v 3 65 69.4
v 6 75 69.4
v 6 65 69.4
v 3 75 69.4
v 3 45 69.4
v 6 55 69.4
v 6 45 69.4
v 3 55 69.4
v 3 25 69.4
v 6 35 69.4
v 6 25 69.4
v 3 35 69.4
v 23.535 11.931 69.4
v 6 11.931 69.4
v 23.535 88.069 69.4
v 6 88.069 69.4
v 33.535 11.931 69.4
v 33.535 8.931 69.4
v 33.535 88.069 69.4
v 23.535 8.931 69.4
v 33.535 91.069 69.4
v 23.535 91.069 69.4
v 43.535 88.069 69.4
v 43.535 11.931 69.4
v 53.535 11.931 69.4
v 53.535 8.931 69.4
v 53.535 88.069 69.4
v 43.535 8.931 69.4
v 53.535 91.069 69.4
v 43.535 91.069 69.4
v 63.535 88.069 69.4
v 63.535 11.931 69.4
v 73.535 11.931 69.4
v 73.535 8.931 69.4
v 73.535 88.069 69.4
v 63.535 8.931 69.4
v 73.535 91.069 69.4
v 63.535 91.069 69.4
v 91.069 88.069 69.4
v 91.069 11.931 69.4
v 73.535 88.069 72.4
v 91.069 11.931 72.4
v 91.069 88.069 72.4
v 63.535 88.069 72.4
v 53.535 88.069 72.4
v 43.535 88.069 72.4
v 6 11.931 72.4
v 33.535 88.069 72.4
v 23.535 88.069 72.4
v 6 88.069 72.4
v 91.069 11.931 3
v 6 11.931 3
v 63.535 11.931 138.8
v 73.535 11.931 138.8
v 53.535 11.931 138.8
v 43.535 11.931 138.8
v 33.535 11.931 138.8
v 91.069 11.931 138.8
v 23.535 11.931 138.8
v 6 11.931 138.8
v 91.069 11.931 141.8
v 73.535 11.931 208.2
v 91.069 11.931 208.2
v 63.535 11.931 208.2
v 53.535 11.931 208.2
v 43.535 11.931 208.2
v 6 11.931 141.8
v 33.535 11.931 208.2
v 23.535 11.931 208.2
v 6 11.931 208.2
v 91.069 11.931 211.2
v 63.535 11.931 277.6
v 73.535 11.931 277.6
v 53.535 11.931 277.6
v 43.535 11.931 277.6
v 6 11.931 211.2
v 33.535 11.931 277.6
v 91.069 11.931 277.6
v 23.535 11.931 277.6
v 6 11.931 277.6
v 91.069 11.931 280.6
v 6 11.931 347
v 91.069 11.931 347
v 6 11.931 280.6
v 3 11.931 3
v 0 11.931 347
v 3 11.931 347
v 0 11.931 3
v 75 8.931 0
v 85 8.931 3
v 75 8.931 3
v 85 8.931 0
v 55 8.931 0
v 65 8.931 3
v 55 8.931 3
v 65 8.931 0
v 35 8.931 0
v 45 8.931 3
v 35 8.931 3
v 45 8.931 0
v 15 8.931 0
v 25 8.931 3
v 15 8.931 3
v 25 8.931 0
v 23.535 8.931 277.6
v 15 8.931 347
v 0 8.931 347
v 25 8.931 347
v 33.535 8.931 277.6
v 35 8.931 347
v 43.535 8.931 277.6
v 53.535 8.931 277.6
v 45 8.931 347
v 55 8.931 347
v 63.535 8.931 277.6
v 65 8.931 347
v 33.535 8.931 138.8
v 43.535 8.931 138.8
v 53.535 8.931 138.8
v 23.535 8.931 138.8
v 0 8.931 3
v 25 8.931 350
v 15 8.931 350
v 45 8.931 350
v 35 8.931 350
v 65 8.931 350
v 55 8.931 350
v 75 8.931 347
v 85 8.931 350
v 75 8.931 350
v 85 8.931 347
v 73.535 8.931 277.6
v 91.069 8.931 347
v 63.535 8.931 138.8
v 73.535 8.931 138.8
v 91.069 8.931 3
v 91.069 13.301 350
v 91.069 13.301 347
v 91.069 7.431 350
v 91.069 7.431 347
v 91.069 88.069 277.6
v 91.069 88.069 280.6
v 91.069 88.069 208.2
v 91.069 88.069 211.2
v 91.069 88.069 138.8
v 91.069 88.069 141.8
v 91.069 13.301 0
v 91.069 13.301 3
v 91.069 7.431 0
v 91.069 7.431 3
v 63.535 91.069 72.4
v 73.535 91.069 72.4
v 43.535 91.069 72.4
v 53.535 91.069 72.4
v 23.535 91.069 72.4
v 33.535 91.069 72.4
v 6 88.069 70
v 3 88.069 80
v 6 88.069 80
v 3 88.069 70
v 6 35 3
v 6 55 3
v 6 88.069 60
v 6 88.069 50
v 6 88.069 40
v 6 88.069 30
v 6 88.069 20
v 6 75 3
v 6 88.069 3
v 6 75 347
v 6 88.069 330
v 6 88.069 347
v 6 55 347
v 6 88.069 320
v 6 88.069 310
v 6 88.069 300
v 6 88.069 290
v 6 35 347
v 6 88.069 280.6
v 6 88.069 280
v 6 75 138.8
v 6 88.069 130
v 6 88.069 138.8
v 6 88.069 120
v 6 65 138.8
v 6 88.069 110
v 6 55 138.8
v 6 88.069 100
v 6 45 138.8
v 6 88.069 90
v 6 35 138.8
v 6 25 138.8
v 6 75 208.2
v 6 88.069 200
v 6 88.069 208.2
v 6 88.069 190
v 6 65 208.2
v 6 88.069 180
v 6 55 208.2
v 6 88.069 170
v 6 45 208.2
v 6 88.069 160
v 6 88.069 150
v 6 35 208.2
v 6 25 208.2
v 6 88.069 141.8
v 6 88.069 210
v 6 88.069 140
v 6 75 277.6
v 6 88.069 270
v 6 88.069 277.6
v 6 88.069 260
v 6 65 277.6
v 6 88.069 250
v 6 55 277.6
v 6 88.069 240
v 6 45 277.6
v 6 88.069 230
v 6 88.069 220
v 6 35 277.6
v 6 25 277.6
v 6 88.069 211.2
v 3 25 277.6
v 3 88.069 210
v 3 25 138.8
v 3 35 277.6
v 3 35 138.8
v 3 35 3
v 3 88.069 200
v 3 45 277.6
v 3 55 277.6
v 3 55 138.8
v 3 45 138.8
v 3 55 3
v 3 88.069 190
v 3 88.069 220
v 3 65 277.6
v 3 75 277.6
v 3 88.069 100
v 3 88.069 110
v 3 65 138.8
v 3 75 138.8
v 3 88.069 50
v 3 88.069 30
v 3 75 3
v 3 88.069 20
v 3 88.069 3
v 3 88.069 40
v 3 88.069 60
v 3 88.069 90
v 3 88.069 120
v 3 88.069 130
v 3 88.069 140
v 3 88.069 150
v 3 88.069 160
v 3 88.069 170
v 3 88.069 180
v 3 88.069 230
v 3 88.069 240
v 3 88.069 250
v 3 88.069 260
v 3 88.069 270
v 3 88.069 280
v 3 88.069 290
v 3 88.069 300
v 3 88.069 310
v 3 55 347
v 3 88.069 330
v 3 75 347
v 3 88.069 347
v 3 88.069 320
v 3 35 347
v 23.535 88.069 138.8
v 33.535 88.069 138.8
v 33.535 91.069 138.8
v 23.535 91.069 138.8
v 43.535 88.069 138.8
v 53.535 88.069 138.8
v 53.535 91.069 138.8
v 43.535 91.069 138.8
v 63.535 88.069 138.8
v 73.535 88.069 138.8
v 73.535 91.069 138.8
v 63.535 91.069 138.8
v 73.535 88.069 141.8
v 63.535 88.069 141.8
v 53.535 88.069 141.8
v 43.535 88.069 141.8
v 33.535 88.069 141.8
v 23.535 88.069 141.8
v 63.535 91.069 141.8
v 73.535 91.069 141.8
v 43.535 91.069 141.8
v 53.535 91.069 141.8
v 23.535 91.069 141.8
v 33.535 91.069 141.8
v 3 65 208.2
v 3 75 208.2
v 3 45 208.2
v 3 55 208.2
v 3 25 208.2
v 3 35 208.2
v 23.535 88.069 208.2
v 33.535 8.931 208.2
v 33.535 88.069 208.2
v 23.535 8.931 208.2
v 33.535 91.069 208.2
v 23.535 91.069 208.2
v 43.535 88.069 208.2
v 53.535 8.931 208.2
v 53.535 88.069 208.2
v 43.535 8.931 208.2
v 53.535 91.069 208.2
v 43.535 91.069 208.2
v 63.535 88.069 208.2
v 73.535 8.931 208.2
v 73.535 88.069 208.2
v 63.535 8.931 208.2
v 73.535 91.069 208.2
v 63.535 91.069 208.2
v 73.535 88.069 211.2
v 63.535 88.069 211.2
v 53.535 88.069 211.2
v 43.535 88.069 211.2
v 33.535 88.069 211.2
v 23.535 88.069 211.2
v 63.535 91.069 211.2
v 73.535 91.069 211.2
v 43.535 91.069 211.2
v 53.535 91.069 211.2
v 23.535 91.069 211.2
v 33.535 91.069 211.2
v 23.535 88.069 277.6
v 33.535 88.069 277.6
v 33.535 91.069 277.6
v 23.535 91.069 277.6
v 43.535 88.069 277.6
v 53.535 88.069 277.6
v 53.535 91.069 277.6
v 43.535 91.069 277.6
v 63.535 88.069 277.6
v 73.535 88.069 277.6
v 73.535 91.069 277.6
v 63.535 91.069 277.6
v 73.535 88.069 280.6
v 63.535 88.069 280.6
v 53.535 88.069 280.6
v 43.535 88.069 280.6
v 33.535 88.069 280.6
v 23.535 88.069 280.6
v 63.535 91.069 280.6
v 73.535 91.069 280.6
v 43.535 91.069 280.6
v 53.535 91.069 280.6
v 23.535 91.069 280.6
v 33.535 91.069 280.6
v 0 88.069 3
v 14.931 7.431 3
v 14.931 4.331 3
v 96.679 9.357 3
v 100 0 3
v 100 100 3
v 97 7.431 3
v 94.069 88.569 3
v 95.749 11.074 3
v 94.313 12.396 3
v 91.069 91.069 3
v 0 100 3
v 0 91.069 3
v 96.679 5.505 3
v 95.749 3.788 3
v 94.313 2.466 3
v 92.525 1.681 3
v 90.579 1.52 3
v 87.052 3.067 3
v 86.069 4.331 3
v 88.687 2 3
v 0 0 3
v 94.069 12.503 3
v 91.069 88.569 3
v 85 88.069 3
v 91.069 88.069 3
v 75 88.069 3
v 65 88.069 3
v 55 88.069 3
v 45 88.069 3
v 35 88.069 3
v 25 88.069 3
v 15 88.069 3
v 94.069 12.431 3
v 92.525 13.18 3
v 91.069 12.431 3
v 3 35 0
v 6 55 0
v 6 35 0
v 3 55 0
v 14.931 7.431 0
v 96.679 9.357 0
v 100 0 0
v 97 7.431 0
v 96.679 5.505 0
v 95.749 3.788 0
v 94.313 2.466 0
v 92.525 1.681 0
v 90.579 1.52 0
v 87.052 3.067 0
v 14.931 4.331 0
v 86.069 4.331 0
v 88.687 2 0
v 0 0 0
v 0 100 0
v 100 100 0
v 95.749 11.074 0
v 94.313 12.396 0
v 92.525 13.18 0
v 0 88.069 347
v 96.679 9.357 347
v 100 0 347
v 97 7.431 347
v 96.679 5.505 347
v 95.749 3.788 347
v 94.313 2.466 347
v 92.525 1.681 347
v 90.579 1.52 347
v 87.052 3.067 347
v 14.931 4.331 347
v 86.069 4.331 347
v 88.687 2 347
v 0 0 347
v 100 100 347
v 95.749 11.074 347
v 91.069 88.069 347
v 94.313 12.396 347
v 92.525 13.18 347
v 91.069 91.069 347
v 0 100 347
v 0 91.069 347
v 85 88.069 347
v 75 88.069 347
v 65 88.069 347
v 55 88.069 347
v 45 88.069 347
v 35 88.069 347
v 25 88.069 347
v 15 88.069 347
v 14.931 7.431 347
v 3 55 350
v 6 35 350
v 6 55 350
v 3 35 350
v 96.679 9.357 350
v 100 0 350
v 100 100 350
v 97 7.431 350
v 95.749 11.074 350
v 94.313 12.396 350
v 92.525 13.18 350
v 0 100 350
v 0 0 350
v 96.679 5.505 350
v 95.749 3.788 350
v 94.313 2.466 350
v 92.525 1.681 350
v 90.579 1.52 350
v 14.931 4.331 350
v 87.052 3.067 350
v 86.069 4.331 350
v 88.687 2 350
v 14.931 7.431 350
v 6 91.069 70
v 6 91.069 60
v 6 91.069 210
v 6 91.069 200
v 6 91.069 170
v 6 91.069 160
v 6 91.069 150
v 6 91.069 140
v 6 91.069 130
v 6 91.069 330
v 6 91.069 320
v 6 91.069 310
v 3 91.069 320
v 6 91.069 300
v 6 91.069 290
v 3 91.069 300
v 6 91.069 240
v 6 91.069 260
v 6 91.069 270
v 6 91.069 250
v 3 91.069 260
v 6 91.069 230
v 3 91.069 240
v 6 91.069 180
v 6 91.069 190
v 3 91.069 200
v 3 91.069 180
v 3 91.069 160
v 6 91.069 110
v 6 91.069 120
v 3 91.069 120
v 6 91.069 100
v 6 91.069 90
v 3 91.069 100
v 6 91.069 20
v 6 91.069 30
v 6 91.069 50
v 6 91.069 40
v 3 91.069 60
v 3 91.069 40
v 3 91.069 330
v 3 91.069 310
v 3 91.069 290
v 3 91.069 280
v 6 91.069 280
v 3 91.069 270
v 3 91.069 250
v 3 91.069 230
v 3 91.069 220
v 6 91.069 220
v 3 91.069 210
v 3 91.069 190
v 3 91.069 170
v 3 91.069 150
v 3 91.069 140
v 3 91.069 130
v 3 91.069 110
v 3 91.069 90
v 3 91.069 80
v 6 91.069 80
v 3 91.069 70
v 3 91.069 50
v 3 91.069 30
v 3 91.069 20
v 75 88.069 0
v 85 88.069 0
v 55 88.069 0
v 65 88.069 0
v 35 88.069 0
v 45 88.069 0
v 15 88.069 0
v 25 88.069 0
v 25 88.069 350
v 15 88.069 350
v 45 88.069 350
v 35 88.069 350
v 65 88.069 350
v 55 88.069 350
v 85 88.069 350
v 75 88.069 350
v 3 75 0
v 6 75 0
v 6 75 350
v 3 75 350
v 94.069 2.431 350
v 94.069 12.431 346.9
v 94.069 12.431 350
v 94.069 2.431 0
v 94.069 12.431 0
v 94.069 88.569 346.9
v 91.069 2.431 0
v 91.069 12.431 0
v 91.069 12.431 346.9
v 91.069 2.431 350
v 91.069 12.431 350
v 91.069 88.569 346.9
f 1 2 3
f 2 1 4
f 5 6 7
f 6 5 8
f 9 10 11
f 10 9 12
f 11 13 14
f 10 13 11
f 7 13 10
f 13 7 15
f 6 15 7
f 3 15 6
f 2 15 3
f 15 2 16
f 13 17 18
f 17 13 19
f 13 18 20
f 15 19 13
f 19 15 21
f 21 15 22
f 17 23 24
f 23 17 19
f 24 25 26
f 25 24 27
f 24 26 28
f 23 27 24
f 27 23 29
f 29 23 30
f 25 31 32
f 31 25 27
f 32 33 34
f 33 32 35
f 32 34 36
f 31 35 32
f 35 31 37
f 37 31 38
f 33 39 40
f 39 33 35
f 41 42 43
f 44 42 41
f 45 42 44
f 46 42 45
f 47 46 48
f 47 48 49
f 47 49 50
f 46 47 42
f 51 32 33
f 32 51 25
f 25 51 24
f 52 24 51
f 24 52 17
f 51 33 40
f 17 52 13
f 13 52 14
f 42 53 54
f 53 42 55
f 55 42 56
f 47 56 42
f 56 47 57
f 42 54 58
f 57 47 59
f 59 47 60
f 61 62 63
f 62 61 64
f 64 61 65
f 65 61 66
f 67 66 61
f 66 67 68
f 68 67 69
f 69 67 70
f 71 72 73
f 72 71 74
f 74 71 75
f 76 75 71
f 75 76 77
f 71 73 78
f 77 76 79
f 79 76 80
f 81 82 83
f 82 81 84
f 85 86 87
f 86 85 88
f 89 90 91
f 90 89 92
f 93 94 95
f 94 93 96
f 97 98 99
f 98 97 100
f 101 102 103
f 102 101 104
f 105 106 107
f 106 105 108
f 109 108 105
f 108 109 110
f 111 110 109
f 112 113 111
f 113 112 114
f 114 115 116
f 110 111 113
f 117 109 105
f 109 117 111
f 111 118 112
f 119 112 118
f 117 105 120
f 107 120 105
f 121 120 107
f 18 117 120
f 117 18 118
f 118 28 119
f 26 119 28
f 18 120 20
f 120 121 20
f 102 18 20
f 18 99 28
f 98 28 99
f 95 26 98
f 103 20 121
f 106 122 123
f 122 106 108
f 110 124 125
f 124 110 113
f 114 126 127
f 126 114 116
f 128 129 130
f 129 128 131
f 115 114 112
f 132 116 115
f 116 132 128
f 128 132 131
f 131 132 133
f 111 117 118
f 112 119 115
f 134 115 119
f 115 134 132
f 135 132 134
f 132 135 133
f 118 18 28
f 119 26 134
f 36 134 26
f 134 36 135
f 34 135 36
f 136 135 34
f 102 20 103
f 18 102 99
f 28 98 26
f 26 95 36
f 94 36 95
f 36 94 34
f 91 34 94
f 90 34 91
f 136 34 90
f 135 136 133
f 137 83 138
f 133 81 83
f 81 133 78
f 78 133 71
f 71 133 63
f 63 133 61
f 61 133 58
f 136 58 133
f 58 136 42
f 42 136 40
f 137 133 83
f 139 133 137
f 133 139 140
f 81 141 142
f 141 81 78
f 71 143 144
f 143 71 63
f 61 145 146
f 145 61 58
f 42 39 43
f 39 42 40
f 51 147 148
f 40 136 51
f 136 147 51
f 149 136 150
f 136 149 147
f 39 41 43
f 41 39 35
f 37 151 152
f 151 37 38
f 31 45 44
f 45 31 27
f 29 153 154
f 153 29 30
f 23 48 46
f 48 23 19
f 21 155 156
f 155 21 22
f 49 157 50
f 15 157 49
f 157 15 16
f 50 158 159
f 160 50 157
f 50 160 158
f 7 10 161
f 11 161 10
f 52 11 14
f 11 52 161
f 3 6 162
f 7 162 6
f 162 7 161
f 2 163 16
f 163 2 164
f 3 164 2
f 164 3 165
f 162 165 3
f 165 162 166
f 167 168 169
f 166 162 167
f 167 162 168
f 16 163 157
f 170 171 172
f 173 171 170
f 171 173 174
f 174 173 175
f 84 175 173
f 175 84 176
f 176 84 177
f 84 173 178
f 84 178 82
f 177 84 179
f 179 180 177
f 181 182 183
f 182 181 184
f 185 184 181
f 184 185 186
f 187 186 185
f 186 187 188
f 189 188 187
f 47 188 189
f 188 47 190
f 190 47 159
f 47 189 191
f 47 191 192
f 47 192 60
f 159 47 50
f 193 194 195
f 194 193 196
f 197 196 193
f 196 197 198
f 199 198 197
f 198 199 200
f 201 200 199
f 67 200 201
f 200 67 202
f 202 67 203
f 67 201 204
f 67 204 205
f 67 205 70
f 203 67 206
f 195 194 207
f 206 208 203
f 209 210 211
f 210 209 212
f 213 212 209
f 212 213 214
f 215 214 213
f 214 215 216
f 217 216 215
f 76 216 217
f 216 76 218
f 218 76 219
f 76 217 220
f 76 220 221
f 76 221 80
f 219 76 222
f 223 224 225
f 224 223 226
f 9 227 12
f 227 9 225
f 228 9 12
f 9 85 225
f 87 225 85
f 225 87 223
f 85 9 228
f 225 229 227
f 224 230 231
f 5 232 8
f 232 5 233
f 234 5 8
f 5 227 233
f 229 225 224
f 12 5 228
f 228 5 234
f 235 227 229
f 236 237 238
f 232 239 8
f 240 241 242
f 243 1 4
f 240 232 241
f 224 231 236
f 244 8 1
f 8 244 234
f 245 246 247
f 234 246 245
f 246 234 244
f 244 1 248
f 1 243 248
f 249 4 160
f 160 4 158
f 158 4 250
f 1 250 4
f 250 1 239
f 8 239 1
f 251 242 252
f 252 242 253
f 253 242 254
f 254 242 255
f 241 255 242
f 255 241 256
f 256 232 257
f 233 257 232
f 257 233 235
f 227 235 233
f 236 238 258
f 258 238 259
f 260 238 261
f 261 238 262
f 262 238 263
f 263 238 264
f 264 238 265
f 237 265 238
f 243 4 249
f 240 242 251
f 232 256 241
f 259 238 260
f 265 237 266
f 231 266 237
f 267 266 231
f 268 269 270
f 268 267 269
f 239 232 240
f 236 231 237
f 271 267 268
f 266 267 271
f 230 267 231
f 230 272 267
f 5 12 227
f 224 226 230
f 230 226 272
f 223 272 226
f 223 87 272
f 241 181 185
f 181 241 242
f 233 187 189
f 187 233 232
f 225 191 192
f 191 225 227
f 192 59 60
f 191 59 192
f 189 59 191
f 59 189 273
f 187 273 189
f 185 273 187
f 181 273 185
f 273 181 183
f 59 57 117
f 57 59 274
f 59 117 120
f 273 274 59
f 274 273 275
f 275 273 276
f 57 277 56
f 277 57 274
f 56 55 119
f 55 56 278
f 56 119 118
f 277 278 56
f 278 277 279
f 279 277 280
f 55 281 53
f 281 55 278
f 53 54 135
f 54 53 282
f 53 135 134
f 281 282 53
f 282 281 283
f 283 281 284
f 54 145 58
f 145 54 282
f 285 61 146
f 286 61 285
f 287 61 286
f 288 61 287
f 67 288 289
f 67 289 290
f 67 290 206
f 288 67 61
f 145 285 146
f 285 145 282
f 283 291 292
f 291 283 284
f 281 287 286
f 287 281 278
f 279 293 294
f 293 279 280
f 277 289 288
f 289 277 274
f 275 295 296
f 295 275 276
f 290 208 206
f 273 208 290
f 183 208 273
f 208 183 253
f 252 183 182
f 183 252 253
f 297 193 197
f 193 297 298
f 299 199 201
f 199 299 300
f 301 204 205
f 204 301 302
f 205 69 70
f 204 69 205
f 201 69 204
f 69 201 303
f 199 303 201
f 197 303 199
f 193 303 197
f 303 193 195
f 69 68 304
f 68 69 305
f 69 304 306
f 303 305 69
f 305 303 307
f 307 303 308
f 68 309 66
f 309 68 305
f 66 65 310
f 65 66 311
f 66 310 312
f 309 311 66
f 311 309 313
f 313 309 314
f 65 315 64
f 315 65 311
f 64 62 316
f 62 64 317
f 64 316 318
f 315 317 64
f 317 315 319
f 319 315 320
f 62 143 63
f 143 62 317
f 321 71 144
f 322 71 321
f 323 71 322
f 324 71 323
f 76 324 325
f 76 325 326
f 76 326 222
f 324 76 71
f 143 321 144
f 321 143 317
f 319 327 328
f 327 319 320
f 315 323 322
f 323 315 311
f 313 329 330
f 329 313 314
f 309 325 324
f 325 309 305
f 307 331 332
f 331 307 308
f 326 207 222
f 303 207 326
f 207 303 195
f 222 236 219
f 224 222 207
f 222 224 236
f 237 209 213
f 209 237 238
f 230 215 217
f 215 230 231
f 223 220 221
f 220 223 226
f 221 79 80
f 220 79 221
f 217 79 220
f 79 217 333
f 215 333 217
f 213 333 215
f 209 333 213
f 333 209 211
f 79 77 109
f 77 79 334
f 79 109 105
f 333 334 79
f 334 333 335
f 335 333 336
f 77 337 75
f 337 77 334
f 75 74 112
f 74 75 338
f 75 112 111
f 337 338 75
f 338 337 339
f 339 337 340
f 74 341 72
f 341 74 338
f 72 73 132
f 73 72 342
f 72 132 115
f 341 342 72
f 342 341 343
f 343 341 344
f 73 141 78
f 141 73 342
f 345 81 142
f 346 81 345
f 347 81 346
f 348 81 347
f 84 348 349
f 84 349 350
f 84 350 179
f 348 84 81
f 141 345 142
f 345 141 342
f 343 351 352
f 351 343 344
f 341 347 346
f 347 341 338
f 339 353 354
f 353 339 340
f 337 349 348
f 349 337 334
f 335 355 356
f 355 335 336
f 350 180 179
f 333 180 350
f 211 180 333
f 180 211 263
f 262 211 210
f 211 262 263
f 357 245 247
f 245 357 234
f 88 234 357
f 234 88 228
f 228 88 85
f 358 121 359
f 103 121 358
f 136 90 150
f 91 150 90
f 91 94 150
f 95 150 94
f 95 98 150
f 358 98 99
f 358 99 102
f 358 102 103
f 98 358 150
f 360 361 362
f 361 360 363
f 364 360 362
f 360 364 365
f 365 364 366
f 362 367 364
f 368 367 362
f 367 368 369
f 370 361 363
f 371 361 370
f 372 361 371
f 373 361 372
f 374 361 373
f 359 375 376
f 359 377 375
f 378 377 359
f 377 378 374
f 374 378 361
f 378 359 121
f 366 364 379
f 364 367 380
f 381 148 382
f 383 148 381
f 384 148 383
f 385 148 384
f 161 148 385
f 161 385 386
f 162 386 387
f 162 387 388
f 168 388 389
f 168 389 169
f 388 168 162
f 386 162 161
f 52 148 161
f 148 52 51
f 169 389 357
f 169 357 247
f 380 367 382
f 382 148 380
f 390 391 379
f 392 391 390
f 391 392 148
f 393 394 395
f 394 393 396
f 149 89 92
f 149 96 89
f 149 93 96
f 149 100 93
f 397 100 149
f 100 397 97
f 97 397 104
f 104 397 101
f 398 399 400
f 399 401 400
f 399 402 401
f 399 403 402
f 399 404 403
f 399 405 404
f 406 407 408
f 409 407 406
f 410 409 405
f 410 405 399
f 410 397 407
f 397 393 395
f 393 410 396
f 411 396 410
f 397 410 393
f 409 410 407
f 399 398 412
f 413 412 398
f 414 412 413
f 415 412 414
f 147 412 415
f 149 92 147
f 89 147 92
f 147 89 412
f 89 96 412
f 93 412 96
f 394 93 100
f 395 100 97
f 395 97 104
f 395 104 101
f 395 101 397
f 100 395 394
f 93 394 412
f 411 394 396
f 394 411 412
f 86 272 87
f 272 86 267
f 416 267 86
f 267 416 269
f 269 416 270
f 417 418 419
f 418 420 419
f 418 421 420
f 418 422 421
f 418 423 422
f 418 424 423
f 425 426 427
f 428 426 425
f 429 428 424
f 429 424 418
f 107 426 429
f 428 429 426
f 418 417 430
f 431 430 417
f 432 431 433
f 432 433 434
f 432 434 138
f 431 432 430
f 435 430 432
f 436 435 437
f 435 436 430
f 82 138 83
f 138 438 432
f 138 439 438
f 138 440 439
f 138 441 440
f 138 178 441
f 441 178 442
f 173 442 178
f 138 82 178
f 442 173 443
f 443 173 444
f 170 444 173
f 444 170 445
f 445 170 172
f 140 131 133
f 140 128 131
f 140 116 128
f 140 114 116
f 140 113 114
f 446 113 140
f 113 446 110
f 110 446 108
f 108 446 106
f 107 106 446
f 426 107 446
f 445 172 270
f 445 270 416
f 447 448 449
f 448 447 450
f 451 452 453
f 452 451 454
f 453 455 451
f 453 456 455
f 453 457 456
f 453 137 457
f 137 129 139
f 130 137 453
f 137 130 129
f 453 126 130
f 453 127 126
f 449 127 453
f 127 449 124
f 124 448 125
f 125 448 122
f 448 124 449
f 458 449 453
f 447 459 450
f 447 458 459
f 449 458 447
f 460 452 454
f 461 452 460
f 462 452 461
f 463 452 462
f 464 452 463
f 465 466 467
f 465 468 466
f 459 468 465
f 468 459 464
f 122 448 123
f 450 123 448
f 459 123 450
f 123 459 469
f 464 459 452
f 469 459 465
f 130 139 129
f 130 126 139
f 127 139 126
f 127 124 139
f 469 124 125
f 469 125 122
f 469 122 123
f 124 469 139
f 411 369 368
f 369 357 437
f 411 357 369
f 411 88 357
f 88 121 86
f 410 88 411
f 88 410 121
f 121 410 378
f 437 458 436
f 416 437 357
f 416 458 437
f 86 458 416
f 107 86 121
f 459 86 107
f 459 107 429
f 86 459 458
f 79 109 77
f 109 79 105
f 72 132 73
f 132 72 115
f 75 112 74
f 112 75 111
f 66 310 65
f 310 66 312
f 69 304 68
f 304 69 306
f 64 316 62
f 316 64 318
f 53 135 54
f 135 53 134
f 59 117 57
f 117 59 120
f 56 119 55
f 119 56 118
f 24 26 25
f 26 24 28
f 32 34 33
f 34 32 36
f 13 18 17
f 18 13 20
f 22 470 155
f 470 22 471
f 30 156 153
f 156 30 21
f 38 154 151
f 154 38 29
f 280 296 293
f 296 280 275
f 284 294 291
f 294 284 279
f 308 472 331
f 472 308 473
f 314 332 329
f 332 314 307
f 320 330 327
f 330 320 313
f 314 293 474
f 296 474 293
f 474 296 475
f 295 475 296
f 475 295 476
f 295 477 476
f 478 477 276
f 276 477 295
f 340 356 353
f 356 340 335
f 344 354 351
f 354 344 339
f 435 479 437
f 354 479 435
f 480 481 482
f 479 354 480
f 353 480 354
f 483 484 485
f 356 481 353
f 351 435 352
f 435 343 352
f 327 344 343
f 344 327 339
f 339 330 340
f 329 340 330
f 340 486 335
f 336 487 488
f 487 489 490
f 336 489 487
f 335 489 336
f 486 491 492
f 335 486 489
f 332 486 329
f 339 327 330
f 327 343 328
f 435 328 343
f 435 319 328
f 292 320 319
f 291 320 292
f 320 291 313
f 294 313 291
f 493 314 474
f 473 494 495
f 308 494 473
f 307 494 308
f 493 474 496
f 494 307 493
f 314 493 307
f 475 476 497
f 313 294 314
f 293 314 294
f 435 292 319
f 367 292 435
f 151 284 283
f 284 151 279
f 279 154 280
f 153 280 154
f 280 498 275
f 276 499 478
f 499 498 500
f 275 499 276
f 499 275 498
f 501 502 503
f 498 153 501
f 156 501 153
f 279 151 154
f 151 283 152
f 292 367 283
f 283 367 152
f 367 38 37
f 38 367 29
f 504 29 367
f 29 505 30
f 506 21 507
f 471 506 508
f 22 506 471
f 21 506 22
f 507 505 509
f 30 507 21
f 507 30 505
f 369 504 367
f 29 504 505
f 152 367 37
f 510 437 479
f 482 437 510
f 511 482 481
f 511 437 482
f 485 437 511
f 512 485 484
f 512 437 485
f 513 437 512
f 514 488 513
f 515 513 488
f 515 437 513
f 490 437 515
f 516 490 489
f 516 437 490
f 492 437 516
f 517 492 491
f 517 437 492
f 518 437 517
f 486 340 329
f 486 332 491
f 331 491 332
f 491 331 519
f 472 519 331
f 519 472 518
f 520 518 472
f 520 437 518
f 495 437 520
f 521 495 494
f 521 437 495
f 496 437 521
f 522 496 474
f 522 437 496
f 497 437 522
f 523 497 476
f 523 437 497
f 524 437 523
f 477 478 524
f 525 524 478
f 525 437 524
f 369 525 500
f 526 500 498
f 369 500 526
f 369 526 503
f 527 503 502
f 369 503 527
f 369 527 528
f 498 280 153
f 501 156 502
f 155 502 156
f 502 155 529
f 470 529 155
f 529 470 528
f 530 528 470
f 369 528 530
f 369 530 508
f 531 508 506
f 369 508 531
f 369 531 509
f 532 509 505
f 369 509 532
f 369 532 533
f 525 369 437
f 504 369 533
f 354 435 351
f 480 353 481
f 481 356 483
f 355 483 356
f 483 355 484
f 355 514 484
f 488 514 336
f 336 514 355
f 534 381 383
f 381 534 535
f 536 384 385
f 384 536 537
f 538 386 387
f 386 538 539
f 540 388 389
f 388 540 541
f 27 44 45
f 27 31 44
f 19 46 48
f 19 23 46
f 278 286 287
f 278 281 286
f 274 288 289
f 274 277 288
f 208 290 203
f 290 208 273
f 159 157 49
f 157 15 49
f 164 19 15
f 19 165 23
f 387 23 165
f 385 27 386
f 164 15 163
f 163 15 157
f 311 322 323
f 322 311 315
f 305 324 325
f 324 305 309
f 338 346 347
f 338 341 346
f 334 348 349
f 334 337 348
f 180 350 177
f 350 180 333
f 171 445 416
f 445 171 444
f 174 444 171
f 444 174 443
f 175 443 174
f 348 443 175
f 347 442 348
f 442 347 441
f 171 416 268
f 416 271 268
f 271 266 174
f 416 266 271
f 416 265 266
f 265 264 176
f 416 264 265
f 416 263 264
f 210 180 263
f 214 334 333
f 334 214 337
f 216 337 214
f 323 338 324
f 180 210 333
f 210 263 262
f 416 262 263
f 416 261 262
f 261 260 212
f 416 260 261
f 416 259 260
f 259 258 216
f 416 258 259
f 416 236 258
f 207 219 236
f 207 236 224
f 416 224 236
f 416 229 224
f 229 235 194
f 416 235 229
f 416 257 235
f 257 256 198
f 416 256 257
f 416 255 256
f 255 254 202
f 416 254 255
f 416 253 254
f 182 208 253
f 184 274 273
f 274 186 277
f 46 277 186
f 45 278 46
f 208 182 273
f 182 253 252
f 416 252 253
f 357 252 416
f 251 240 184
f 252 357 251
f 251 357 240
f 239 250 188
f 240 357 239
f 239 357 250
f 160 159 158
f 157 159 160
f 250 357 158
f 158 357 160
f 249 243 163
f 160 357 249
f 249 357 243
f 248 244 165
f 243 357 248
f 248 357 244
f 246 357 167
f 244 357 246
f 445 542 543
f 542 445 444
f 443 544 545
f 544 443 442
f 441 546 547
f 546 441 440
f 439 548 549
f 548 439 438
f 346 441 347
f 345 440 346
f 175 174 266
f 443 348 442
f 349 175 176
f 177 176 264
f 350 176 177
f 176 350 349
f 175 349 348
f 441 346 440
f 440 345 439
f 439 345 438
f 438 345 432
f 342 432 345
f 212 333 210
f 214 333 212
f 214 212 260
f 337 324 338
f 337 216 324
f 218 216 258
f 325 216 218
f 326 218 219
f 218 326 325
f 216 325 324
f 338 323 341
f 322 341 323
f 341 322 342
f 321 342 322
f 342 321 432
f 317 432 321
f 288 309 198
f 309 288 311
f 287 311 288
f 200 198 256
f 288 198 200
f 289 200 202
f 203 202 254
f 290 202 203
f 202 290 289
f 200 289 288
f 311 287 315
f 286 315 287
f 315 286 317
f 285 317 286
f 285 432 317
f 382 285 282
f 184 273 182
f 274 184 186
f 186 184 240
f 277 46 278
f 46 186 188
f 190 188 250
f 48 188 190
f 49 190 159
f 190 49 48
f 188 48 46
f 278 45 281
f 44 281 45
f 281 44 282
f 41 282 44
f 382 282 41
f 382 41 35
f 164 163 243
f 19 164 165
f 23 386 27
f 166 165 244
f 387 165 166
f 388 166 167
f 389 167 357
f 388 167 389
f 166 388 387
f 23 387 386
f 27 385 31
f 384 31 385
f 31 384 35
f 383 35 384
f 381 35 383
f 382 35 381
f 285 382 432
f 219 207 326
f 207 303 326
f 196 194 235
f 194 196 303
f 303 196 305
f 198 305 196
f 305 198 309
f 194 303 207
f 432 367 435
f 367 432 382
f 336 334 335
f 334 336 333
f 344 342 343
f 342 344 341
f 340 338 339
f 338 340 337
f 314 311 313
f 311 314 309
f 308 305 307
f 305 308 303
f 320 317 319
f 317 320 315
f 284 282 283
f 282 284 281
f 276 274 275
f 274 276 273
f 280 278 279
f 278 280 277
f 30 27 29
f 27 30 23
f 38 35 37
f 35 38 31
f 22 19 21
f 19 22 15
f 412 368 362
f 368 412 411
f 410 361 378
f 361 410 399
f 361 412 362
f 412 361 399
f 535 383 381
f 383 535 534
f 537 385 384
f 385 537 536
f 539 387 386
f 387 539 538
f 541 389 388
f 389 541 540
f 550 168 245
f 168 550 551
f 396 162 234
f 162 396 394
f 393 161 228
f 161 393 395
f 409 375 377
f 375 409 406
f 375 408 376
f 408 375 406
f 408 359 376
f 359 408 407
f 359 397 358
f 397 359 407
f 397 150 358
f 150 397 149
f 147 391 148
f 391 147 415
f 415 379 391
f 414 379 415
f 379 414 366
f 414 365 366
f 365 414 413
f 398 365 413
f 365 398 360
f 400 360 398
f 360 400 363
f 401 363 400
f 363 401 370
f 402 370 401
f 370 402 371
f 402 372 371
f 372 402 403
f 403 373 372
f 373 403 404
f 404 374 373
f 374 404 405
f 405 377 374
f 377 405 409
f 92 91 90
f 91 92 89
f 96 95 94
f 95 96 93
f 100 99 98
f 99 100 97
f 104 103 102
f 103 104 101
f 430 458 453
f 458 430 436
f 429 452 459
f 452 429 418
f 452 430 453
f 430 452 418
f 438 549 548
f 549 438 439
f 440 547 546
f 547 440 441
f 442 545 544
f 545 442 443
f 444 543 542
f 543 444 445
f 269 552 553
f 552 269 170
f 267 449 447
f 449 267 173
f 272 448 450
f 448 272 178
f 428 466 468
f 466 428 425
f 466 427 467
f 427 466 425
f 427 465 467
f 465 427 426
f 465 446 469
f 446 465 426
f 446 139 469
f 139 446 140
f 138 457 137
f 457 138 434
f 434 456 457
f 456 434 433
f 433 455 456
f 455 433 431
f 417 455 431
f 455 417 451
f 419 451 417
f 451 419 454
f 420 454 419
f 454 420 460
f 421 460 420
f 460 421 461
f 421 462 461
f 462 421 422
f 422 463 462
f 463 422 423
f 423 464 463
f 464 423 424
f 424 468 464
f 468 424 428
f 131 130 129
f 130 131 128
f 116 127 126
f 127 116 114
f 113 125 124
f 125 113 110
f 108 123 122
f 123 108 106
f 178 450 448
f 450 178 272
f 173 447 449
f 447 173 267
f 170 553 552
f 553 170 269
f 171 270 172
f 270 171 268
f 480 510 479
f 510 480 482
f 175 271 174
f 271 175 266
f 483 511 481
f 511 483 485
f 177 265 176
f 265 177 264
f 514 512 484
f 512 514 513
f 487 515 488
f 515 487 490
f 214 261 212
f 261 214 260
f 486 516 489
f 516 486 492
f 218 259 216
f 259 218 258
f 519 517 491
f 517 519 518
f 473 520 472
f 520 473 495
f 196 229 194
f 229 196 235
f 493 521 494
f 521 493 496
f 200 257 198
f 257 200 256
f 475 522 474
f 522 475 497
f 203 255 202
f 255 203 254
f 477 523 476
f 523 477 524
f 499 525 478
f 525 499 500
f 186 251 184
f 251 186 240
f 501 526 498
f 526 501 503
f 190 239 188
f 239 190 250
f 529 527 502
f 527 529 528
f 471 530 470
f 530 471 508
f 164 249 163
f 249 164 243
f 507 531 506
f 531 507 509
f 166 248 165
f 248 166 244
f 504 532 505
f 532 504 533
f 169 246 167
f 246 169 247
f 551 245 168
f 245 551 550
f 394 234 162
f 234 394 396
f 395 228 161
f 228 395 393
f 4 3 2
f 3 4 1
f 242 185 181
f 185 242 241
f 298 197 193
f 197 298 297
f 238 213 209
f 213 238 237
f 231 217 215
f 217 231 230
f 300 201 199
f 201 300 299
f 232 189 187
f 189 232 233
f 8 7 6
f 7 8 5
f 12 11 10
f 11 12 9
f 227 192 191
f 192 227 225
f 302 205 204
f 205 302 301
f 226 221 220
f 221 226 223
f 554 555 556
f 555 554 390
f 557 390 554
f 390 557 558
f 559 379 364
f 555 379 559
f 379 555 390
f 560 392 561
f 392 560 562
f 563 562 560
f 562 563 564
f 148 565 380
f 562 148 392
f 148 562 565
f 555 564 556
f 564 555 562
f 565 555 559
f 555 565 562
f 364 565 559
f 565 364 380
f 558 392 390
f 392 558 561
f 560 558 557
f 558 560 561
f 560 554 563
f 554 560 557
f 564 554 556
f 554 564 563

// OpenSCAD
// file: lib.scad
// Das Modul verzahnugn() macht die form, für eine Reihe von Zähnen (true) beziehungsweise Löcher (false) für dies Zähne. Die laenge gibt an, über welche Strecke verzahnt werden soll, wobei darauf geachtet ist, dass dafor und dahinter genügend Platz bleibt. z gibt an, ob die form für den Zapfen oder für den Stollen gemacht werden soll. Und die zahnlaenge, wie  groß die Zähne werden.
// Es benutzt die Module Zapfen (Zähne) und Stollen (Löcher). Ausserdem hängt es von den Besonderen Variablen $thickness und $spiel ab.

module verzahnung(laenge, z = true,zahnlaenge=10)
{
   
    positionen=[for (k = [zahnlaenge : 2*zahnlaenge : laenge-2*zahnlaenge])k];
    if (!(len(positionen)>0)) echo("<font color='red'>verzahnungsfehler</font>");
    if (len(positionen)==1) echo("<font color='red'>reicht dir ein Zahn?</font>");

    rest=laenge-(positionen[len(positionen)-1]+zahnlaenge);
    translate([0,(rest-zahnlaenge)/2])
    {
        for (k = positionen)
        {
               translate([0,k]) 
		{ 
                if (z) zapfen(zahnlaenge);
                else stollen (zahnlaenge);
                }
         }
     }
}

//Das Modul stollen() macht die Form für ein einzelnes Loch passend zum dazugehörigen Zapfen.

module stollen(zahnlaenge=10)
{
    translate([-0.5*$spiel, 0]) square([$thickness+$spiel, zahnlaenge]);
}

//Das Modul zapfen() macht die Form für einen einzelnen Zahn, passend zum dazugehörigen Stollen.

module zapfen(zahnlaenge=10)
{
    wurzel=0.1;  
    //gibt an, wie weit sich der Zapfen mit seinem ursrpung überschneidet hierdurch wird verhindert, dass kleine rechenfehler dazu führen, dass er abgeschnitten wird.
    translate([-wurzel, 0.5*$spiel]) square([$thickness+wurzel, zahnlaenge - $spiel]);
}

 function tensor (z)
	=(
	z ? 1
	:
	!z ? 0
    : false
	);

 module steckung(laenge,z=true)
{
	
translate([laenge*tensor(z)/2,-0.5*$spiel])square([laenge/2+$spiel/2,$thickness+$spiel]);

}
//Das Modul aufbau gibt eine Animationssystematik. Die mit ihm aufgerufenen Module erscheinen in der Reihenfolge des aufrufes.
module aufbau()
{
    for(n=[0:$children-1])if($t*$children>=n)children(n);
}
// main file
$thickness=3; 
$spiel=0;  //wie sehr solls Wackeln

include <lib.scad>;





//Das Modul regal Baut ein einfaches Regal nach festgelegbaren Außenmaßen her. Es stellt sowohl eine Ansicht des vertigen Regals zur verfügung als auch Schnittmuster für alle Bauteile. Als auch eine Anleitung zum zusammenbau.
//Es sind 6 Modies zur auswahl:
//assemble gibt die ansicht des vertig zusammengebauten Regals aus.
//teile gibt ein schnittmuster aus, das alle EinzelTeile des Regals enthällt.
//rueckwand, deckel, bord und seitenwand geben jeweils ein Schnittmuster des entsprechenden Teils aus, wobei daran zu denken ist, dass für das fertige Regal von deckel und Seitenwänden jeweils 2 und von bord eines weniger als man fächer hat benötigt werden
//animation gibt eine animierte Bauanleitung des Zusammenbaus aus. Denke daran, im menuepunkt view animate auszuwählen steps mindestens 10 und FPS etwa 1/10 der steps sind gute Einstellungen um für diese animation
//regal hat 5 EingabeWerte der reihenfolge nach:
// tiefe, breite, hoehe stellen jeweils die entsprechenden Außenmaße da.

//Offene Diskussion: ist die Reihenfolg "tiefe, breite, hoehe" intuitiv? Die im Handwerk übliche reihenfolge "breit, hoehe, tiefe" ist offenkundig Kacke. Die Reheinfolge muss der Coordinatenreihenfolge der Achsen folgen "x,y,z" und die z-Achse bleibt zu kompatibilitätszwecken der hoehe zugeordnet. Wie herrum breite und tiefe der x, und y Achse zugeordnet werden kann diskutiert werden. Das Rational für die gewählte Reihenfolge ist, dass "Länge, Breite, Höhe" eine übliche Reihenfolge ist. hier steht die Breite an zweiter stelle, somit bleibt für die Tiefe nur noch der erste Platz. Sie ist sozusagten ein Synnonym für Länge


// die Variable faecher ....
// Der modus gibt den oben angegebenen Modus an
// Der Rand gibt an, wie weit Deckel und Boden überstehen
// Das Modul Regal  Greift auf das Modul verzahnung zurück und ist daher von den Modulenh verzahnung, stollen so wie zapfen abhängig. 
//Die besonderen Variablen $thickness und $spiel beeinflussen es. Man sehe also zu, dass diese gesetzt sind




assemble=0;
teile=1;
rueckwand=2;
deckel=3;
bord=4;
seitenwand=5;
animation=6;

Schrank(modus=0 );
module Schrank(
            breite=100,
            hoehe=350,
            faecher=5,
            modus=0,
            rand=3,
            gelenk=10,
            platz=0.1,
            )
{
    //hier wird der Modus ausgeführt. die entsprechenden Module stehen weiter unten.
    if(modus==0) animation($t=1);
    if(modus==1) teile();
    if(modus==2) rueckwand();
    if(modus==3) deckel();
    if(modus==4) bord();
    if(modus==5) seitenwand();
    if(modus==6) animation();
    if(modus==7) tuer();  
        
    
   tiefe=breite;
   gelenkradius= norm([0.5*gelenk,$thickness])+platz; 
   DELTA = 0.001; 
        //DELTA Produziert einen minimalen Abstand zwischen dein Teilen, damit hier überhaupt ein Schnitt stattfindet dieses findet im Modul teile() statt.
    

   
   //zwar sind in diesem Design der Rand an der Rückseite und an den seiten links und rechts als gleichgroß gesetzt. Ein zukünftiges anderes design könnte hier aber durchaus einen anderen Weg gehen.
    
    rueckrand = rand;
    seitenrand = gelenkradius +rand;
    vorderrand=seitenrand;
    
    //hier werden ein paar maße ausrechnen, die wir später noch brauchen.
    innenhoehe = hoehe-2*$thickness;
    innenbreite = breite-2*($thickness+seitenrand);
    innentiefe = tiefe-($thickness+rueckrand+vorderrand);
    wandtiefe = tiefe-vorderrand;
    
    
    brettpositionen=aufteiler(); //die höhen der bretter gemessen am innenboden 
    echo(brettpositionen);
    brettanzahl=len(brettpositionen);
    
    // die folgende Funktion ermöglicht, dass für die Variable faecher sowohl eine Zahl (die anzahl der Fächer) als auch ein Vector(die positionen der Bretter) eingegeben werden können. Die DefaultWerte sind für diesen zweck eingestellt, in zukünftigen Designs könnte sie jedoch durchaus auch für andere ähnliche zwecke verwendet werden. Bekommt Sie einen Vektor (mit tatsächlichen einträgen) so gibt sie diesen wider aus. Bekommt sie eine Zahl und eine laenge, so gibt sie einen entsprechenden Vektor aus, der die Länge in eine entsprechende Anzahl von fächern unter einbeziehung der aktuellen $thickness aufteilt.
    
    function aufteiler(x=faecher,laenge=innenhoehe)
        =(
            len(x)>=1  ?   x   
            :
            let(zwischenraum=(laenge-(x-1)*$thickness)/x)        
            [for(k=[1:x-1]) k*(zwischenraum+$thickness)-$thickness]
         );

    // nun einige Fehlermeldungen, um schlechte übergabewerte für das Regal abzufangen
    if(!(innenhoehe>0&&innenbreite>0&&innentiefe>0)) echo("<font color='red'>  schlechte eingabewerte in regal()</font>");   
   //hier für die Brettpositionen
    for (k=[1:brettanzahl-1])
	{
		if(!(brettpositionen[k]-$thickness>brettpositionen[k-1])) echo("<font color='red'>  vehlerhafter Eingabewert in fächer </font>");   
	}     
    if (!(brettpositionen[0])>0&&(brettpositionen[brettanzahl-1])<innenhoehe-$thickness)cho("<font color='red'>  vehlerhafter Eingabewert in fächer </font>");   
   
 
  
    
    // Im folgenden werden die einzelteile als 2d formen definiert diese sind im wesentlichen Rechtecke (sqare(vektor)) zu denen Zähne hinzukommen bezihungsweise von denen Löcher abgezogen werden um verbindungen mit benachbarten Brettern herzustellen.  xx_xxx(); stellt dabei jeweils die verbindung zwischen den entsprechenden Modulen da, wobei die eingabe true die Form aufruft, die hinzuzufügen ist und die Eingabe false die entsprechende gegen Form.
    
    module bord()
    {
            square([innentiefe, innenbreite]); //hauptteil
            mirror() bord_rueckwand(true);
                    bord_seitenwand(true);
           translate( [0, innenbreite]) mirror([0,1]) bord_seitenwand(true);
        
    }
    
    
    
    module rueckwand()
    {
        difference()
        {
            square([innenhoehe, innenbreite]);  //hauptteil
            for (k = brettpositionen)
                translate([k, 0]) bord_rueckwand(false);
        }
        mirror() deckel_rueckwand(true);
        translate( [innenhoehe, 0]) deckel_rueckwand(true);
        rotate(-90) seitenwand_rueckwand();
        translate([0, innenbreite])
                rotate(-90) mirror() seitenwand_rueckwand();
    }
    
    
    
    
    module deckel()
    {
        difference()
        {
            square([tiefe, breite]);	//hauptteil
            translate([rueckrand, $thickness+seitenrand]) deckel_rueckwand(false);
            for (k = [$thickness+seitenrand, breite-seitenrand])
                translate([0, k]) deckel_seitenwand(false);
           // translate([wandtiefe,breite-seitenrand+0.5*rand])fuehrung();
               translate([wandtiefe,seitenrand-0.5*rand]) mirror([0,1]) fuehrung();

        }
    }
    
    
    
    module seitenwand()
    {
        difference()
        {
            square([wandtiefe, innenhoehe]);	//hauptteil
            for (v = brettpositionen)
                translate([$thickness+rueckrand, v+$thickness]) 
                    bord_seitenwand(false);
            translate([rueckrand,0,0]) seitenwand_rueckwand(false);
        }
        deckel_seitenwand(true);
        translate([ 0,innenhoehe]) mirror([0,1]) deckel_seitenwand(true);
    }
    module tuer()
    {
        translate([0,-0.5*gelenk])
        {
            translate([$thickness,0])square([innenhoehe-platz,innenbreite+gelenk]);
            square([hoehe,gelenk]);
        }
    }
    module fuehrung()
    {
        difference()
        {
            circle(gelenkradius);
            translate([-gelenkradius,-gelenkradius])square(gelenkradius);
        }
        translate([-innenbreite,0])square([innenbreite,$thickness+platz]);
    }
    
    // hier folgt eine Liste der jeweiligen Verbindungen zwischen den Modulen. zwar wird hier zeweils nur die verbindung verzahnung() verwendete andere sind jedoch möglich. 
   //Man könnte sich nun Fragen, warum ich aus jedem der aufruf der verzahnung() ein eigenes Modul gemacht hab. es geht natürlich darum semantic und content zu trennen.
  //Sollten z.B. zu einem späteren Zeitpunkt weitere Konektoren hinzu kommen, so kann ein entsprechender fork dieses projektes diese in die zugehörigen module einschreiben und sie werden ihren Weg an die richtige Stelle in den jeweiligen Brettern finden.
    
    module seitenwand_rueckwand(z = true)
    {
        verzahnung(innenhoehe, z);
    }
     
    module bord_rueckwand(z = true)
    {
        verzahnung(innenbreite, z);
    }
    
    module deckel_rueckwand(z = true)
    {
        verzahnung(innenbreite, z);
    }
    module bord_seitenwand(z = true)
    {
        rotate(-90) verzahnung(innentiefe,z);
    }
    
    module deckel_seitenwand(z = true)
    {
        rotate(-90) verzahnung(tiefe, z);
    } 
       
    
    // Das folgende Code frakment wird eigendlich nicht mehr gebraucht, da sein ergebnis als spezialfall des Moduls animation() erzeugt werden kann. Zu anschauungszwecken lasse ich es aber ersteinmal da. Es diente das vertige objekt zu sehen. Dieses sollte immer eines der ersten Dinge sein, die man schreibt wenn. Man Schnittmuster für ein objekt macht.
    
    /*
    module assemble()
    {
        for (v = [[0, $thickness, $thickness], [0, breite, $thickness]])
            translate(v)
                rotate([90,0,0])
                    linear_extrude($thickness) seitenbrett();
        
        for (v=[[0,0,0],[0,0,hoehe-$thickness]])
            translate(v)
                linear_extrude($thickness) deckel();
    
        translate([$thickness, $thickness, $thickness]) 
            rotate([0,-90,0])
                linear_extrude($thickness) rueckwand();
    
        for (k = brettpositionen)
            translate([$thickness, $thickness, k+$thickness])
                linear_extrude($thickness) bord();
    }
    */
    

// Das Modul teile() Puzzeled die 2d formen so zusammen, das sie als gemeinsames schnittmuster ausgegeben werden können.


    module teile()
    {


        translate([$thickness, $thickness]) rueckwand();
        
        for (v = 
                [
                    [$thickness, innenbreite+2*$thickness+tiefe+DELTA], 
                    [$thickness, innenbreite+2*($thickness+tiefe+DELTA)]
                ])
            translate(v) 
                rotate(-90) seitenwand();
        
        for (k = [1 : brettanzahl])
            translate([hoehe+k*(innentiefe+$thickness+DELTA)-innentiefe, $thickness])
                bord();
        
        for (v = [[hoehe+DELTA, innenbreite+2*$thickness+tiefe+DELTA],
                [hoehe+DELTA, innenbreite+2*($thickness+tiefe+DELTA)]])
            translate(v)
                rotate(-90) deckel();
    }
    
    // Das Modul animation() erzeugt eine animierte Bauanleitung. Wobei animation($t=1) das vertige Modell zeigt.
    
    
    module animation()
    {
       aufbau()
        {
                 translate([$thickness+rueckrand, $thickness+seitenrand, $thickness])
                rotate([0,-90,0])
                    linear_extrude($thickness) rueckwand();

                for (k = brettpositionen)
                    translate([$thickness+rueckrand, $thickness+seitenrand, k+$thickness])
                        linear_extrude($thickness) bord();
        
                for (v = [[0, $thickness+seitenrand, $thickness], [0, breite-seitenrand, $thickness]])
                    translate(v)
                        rotate([90,0,0])
                            linear_extrude($thickness) seitenwand();
            
             translate([wandtiefe,seitenrand-0.5*rand,0])
               // rotate(-90*$t)
                    translate([$thickness,0,0]) rotate(-90,[0,1,0])  linear_extrude($thickness)tuer();
        

                for (v = [[0, 0, 0], [0, 0, hoehe-$thickness]])
                    translate(v)
                        linear_extrude($thickness) deckel();
               
            

            } 
    }
}
